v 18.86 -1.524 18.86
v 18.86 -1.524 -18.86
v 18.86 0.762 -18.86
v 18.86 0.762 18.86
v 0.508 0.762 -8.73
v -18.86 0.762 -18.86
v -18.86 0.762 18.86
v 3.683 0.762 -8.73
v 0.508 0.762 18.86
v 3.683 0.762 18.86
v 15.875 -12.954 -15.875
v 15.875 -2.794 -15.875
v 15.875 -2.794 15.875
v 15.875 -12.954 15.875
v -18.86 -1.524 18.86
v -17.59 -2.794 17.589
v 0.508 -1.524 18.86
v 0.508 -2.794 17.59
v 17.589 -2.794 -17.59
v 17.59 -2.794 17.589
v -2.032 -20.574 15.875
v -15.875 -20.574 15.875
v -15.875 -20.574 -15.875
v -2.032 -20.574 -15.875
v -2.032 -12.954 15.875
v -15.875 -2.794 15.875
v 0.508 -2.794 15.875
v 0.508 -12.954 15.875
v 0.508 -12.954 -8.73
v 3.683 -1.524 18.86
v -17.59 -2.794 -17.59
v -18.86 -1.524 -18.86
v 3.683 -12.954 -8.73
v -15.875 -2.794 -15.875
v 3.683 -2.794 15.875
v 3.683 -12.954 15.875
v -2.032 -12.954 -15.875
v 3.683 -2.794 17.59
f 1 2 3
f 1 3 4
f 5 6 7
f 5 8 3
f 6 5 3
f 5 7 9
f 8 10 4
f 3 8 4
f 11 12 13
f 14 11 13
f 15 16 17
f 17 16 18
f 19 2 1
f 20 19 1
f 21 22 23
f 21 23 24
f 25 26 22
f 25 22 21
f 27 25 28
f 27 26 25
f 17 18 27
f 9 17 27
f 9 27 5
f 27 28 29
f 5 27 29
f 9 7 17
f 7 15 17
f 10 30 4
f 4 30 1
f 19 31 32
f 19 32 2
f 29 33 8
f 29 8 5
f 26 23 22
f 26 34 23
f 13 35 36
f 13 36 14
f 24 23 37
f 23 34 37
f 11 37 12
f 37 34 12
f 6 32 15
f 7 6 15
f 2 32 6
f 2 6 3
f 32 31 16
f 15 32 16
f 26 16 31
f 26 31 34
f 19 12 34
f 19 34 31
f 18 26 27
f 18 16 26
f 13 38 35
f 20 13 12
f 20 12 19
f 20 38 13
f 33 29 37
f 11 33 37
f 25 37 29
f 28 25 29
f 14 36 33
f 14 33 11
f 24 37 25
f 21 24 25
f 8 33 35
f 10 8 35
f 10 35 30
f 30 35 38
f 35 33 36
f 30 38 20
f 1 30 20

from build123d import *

# Parameters (mm, degrees)
F0_W      = 37.719
F0_H      = 37.719
F1_DEPTH  = 2.794
F2_W      = 31.75
F2_H      = 31.75
F3_DEPTH  = 10.16
F4_SIZE   = 1.27
F5_W      = 13.843
F5_H      = 31.75
F6_DEPTH  = 7.62
F7_W      = 3.175
F7_H      = 24.6046739221
F7_H_2    = 3.0808845013
F8_DEPTH  = 12.955
F9_W      = 3.1516091073
F9_H      = 27.5891739221
F10_DEPTH = 20.575
F11_DEPTH = 0.762


# Not quite as in the source:
# - a feature names something its author has since deleted; it is built from what else it names


with BuildPart() as f1:
    # F0 (on Front) → F1 (new body)
    with BuildSketch(Plane.XZ):
        Rectangle(F0_W, F0_H)
    extrude(amount=F1_DEPTH)

    # F2 (on face) → F3 (join)
    with BuildSketch(Plane.XZ.offset(2.794)):
        Rectangle(F2_W, F2_H)
    extrude(amount=F3_DEPTH)

    # F4
    f4_edges = [f1.edges().sort_by_distance(p)[0] for p in [
        (-18.8595, -2.794, 0),
        (0, -2.794, -18.8595),
        (18.8595, -2.794, 0),
        (0, -2.794, 18.8595),
    ]]
    chamfer(f4_edges, length=F4_SIZE)

    # F5 (on face) → F6 (join)
    with BuildSketch(Plane.XZ.offset(12.954)):
        with Locations((-8.9535, 0)):
            Rectangle(F5_W, F5_H)
    extrude(amount=F6_DEPTH)

    # F7 (on face) → F8 (cut, through all)
    with BuildSketch(Plane.XZ.offset(12.954)):
        with Locations((2.0955, 3.572663039)):
            Rectangle(F7_W, F7_H)
        with Locations((2.0955, 17.4154422507)):
            Rectangle(F7_W, F7_H_2)
    extrude(amount=-F8_DEPTH, mode=Mode.SUBTRACT)

    # F9 (on face) → F10 (cut, through all)
    with BuildSketch(Plane(origin=(0, 0, 0), x_dir=(-1, 0, 0), z_dir=(0, 1, 0))):
        with Locations((-2.0838045536, 5.064913039)):
            Rectangle(F9_W, F9_H)
    extrude(amount=-F10_DEPTH, mode=Mode.SUBTRACT)

    # F11 (add): a face of the model
    f11_faces = [f1.faces().sort_by_distance(p)[0] for p in [
        (-0.1374824949, 0, -0.3323010646),
    ]]
    extrude(f11_faces, amount=F11_DEPTH)


solid = f1.part
